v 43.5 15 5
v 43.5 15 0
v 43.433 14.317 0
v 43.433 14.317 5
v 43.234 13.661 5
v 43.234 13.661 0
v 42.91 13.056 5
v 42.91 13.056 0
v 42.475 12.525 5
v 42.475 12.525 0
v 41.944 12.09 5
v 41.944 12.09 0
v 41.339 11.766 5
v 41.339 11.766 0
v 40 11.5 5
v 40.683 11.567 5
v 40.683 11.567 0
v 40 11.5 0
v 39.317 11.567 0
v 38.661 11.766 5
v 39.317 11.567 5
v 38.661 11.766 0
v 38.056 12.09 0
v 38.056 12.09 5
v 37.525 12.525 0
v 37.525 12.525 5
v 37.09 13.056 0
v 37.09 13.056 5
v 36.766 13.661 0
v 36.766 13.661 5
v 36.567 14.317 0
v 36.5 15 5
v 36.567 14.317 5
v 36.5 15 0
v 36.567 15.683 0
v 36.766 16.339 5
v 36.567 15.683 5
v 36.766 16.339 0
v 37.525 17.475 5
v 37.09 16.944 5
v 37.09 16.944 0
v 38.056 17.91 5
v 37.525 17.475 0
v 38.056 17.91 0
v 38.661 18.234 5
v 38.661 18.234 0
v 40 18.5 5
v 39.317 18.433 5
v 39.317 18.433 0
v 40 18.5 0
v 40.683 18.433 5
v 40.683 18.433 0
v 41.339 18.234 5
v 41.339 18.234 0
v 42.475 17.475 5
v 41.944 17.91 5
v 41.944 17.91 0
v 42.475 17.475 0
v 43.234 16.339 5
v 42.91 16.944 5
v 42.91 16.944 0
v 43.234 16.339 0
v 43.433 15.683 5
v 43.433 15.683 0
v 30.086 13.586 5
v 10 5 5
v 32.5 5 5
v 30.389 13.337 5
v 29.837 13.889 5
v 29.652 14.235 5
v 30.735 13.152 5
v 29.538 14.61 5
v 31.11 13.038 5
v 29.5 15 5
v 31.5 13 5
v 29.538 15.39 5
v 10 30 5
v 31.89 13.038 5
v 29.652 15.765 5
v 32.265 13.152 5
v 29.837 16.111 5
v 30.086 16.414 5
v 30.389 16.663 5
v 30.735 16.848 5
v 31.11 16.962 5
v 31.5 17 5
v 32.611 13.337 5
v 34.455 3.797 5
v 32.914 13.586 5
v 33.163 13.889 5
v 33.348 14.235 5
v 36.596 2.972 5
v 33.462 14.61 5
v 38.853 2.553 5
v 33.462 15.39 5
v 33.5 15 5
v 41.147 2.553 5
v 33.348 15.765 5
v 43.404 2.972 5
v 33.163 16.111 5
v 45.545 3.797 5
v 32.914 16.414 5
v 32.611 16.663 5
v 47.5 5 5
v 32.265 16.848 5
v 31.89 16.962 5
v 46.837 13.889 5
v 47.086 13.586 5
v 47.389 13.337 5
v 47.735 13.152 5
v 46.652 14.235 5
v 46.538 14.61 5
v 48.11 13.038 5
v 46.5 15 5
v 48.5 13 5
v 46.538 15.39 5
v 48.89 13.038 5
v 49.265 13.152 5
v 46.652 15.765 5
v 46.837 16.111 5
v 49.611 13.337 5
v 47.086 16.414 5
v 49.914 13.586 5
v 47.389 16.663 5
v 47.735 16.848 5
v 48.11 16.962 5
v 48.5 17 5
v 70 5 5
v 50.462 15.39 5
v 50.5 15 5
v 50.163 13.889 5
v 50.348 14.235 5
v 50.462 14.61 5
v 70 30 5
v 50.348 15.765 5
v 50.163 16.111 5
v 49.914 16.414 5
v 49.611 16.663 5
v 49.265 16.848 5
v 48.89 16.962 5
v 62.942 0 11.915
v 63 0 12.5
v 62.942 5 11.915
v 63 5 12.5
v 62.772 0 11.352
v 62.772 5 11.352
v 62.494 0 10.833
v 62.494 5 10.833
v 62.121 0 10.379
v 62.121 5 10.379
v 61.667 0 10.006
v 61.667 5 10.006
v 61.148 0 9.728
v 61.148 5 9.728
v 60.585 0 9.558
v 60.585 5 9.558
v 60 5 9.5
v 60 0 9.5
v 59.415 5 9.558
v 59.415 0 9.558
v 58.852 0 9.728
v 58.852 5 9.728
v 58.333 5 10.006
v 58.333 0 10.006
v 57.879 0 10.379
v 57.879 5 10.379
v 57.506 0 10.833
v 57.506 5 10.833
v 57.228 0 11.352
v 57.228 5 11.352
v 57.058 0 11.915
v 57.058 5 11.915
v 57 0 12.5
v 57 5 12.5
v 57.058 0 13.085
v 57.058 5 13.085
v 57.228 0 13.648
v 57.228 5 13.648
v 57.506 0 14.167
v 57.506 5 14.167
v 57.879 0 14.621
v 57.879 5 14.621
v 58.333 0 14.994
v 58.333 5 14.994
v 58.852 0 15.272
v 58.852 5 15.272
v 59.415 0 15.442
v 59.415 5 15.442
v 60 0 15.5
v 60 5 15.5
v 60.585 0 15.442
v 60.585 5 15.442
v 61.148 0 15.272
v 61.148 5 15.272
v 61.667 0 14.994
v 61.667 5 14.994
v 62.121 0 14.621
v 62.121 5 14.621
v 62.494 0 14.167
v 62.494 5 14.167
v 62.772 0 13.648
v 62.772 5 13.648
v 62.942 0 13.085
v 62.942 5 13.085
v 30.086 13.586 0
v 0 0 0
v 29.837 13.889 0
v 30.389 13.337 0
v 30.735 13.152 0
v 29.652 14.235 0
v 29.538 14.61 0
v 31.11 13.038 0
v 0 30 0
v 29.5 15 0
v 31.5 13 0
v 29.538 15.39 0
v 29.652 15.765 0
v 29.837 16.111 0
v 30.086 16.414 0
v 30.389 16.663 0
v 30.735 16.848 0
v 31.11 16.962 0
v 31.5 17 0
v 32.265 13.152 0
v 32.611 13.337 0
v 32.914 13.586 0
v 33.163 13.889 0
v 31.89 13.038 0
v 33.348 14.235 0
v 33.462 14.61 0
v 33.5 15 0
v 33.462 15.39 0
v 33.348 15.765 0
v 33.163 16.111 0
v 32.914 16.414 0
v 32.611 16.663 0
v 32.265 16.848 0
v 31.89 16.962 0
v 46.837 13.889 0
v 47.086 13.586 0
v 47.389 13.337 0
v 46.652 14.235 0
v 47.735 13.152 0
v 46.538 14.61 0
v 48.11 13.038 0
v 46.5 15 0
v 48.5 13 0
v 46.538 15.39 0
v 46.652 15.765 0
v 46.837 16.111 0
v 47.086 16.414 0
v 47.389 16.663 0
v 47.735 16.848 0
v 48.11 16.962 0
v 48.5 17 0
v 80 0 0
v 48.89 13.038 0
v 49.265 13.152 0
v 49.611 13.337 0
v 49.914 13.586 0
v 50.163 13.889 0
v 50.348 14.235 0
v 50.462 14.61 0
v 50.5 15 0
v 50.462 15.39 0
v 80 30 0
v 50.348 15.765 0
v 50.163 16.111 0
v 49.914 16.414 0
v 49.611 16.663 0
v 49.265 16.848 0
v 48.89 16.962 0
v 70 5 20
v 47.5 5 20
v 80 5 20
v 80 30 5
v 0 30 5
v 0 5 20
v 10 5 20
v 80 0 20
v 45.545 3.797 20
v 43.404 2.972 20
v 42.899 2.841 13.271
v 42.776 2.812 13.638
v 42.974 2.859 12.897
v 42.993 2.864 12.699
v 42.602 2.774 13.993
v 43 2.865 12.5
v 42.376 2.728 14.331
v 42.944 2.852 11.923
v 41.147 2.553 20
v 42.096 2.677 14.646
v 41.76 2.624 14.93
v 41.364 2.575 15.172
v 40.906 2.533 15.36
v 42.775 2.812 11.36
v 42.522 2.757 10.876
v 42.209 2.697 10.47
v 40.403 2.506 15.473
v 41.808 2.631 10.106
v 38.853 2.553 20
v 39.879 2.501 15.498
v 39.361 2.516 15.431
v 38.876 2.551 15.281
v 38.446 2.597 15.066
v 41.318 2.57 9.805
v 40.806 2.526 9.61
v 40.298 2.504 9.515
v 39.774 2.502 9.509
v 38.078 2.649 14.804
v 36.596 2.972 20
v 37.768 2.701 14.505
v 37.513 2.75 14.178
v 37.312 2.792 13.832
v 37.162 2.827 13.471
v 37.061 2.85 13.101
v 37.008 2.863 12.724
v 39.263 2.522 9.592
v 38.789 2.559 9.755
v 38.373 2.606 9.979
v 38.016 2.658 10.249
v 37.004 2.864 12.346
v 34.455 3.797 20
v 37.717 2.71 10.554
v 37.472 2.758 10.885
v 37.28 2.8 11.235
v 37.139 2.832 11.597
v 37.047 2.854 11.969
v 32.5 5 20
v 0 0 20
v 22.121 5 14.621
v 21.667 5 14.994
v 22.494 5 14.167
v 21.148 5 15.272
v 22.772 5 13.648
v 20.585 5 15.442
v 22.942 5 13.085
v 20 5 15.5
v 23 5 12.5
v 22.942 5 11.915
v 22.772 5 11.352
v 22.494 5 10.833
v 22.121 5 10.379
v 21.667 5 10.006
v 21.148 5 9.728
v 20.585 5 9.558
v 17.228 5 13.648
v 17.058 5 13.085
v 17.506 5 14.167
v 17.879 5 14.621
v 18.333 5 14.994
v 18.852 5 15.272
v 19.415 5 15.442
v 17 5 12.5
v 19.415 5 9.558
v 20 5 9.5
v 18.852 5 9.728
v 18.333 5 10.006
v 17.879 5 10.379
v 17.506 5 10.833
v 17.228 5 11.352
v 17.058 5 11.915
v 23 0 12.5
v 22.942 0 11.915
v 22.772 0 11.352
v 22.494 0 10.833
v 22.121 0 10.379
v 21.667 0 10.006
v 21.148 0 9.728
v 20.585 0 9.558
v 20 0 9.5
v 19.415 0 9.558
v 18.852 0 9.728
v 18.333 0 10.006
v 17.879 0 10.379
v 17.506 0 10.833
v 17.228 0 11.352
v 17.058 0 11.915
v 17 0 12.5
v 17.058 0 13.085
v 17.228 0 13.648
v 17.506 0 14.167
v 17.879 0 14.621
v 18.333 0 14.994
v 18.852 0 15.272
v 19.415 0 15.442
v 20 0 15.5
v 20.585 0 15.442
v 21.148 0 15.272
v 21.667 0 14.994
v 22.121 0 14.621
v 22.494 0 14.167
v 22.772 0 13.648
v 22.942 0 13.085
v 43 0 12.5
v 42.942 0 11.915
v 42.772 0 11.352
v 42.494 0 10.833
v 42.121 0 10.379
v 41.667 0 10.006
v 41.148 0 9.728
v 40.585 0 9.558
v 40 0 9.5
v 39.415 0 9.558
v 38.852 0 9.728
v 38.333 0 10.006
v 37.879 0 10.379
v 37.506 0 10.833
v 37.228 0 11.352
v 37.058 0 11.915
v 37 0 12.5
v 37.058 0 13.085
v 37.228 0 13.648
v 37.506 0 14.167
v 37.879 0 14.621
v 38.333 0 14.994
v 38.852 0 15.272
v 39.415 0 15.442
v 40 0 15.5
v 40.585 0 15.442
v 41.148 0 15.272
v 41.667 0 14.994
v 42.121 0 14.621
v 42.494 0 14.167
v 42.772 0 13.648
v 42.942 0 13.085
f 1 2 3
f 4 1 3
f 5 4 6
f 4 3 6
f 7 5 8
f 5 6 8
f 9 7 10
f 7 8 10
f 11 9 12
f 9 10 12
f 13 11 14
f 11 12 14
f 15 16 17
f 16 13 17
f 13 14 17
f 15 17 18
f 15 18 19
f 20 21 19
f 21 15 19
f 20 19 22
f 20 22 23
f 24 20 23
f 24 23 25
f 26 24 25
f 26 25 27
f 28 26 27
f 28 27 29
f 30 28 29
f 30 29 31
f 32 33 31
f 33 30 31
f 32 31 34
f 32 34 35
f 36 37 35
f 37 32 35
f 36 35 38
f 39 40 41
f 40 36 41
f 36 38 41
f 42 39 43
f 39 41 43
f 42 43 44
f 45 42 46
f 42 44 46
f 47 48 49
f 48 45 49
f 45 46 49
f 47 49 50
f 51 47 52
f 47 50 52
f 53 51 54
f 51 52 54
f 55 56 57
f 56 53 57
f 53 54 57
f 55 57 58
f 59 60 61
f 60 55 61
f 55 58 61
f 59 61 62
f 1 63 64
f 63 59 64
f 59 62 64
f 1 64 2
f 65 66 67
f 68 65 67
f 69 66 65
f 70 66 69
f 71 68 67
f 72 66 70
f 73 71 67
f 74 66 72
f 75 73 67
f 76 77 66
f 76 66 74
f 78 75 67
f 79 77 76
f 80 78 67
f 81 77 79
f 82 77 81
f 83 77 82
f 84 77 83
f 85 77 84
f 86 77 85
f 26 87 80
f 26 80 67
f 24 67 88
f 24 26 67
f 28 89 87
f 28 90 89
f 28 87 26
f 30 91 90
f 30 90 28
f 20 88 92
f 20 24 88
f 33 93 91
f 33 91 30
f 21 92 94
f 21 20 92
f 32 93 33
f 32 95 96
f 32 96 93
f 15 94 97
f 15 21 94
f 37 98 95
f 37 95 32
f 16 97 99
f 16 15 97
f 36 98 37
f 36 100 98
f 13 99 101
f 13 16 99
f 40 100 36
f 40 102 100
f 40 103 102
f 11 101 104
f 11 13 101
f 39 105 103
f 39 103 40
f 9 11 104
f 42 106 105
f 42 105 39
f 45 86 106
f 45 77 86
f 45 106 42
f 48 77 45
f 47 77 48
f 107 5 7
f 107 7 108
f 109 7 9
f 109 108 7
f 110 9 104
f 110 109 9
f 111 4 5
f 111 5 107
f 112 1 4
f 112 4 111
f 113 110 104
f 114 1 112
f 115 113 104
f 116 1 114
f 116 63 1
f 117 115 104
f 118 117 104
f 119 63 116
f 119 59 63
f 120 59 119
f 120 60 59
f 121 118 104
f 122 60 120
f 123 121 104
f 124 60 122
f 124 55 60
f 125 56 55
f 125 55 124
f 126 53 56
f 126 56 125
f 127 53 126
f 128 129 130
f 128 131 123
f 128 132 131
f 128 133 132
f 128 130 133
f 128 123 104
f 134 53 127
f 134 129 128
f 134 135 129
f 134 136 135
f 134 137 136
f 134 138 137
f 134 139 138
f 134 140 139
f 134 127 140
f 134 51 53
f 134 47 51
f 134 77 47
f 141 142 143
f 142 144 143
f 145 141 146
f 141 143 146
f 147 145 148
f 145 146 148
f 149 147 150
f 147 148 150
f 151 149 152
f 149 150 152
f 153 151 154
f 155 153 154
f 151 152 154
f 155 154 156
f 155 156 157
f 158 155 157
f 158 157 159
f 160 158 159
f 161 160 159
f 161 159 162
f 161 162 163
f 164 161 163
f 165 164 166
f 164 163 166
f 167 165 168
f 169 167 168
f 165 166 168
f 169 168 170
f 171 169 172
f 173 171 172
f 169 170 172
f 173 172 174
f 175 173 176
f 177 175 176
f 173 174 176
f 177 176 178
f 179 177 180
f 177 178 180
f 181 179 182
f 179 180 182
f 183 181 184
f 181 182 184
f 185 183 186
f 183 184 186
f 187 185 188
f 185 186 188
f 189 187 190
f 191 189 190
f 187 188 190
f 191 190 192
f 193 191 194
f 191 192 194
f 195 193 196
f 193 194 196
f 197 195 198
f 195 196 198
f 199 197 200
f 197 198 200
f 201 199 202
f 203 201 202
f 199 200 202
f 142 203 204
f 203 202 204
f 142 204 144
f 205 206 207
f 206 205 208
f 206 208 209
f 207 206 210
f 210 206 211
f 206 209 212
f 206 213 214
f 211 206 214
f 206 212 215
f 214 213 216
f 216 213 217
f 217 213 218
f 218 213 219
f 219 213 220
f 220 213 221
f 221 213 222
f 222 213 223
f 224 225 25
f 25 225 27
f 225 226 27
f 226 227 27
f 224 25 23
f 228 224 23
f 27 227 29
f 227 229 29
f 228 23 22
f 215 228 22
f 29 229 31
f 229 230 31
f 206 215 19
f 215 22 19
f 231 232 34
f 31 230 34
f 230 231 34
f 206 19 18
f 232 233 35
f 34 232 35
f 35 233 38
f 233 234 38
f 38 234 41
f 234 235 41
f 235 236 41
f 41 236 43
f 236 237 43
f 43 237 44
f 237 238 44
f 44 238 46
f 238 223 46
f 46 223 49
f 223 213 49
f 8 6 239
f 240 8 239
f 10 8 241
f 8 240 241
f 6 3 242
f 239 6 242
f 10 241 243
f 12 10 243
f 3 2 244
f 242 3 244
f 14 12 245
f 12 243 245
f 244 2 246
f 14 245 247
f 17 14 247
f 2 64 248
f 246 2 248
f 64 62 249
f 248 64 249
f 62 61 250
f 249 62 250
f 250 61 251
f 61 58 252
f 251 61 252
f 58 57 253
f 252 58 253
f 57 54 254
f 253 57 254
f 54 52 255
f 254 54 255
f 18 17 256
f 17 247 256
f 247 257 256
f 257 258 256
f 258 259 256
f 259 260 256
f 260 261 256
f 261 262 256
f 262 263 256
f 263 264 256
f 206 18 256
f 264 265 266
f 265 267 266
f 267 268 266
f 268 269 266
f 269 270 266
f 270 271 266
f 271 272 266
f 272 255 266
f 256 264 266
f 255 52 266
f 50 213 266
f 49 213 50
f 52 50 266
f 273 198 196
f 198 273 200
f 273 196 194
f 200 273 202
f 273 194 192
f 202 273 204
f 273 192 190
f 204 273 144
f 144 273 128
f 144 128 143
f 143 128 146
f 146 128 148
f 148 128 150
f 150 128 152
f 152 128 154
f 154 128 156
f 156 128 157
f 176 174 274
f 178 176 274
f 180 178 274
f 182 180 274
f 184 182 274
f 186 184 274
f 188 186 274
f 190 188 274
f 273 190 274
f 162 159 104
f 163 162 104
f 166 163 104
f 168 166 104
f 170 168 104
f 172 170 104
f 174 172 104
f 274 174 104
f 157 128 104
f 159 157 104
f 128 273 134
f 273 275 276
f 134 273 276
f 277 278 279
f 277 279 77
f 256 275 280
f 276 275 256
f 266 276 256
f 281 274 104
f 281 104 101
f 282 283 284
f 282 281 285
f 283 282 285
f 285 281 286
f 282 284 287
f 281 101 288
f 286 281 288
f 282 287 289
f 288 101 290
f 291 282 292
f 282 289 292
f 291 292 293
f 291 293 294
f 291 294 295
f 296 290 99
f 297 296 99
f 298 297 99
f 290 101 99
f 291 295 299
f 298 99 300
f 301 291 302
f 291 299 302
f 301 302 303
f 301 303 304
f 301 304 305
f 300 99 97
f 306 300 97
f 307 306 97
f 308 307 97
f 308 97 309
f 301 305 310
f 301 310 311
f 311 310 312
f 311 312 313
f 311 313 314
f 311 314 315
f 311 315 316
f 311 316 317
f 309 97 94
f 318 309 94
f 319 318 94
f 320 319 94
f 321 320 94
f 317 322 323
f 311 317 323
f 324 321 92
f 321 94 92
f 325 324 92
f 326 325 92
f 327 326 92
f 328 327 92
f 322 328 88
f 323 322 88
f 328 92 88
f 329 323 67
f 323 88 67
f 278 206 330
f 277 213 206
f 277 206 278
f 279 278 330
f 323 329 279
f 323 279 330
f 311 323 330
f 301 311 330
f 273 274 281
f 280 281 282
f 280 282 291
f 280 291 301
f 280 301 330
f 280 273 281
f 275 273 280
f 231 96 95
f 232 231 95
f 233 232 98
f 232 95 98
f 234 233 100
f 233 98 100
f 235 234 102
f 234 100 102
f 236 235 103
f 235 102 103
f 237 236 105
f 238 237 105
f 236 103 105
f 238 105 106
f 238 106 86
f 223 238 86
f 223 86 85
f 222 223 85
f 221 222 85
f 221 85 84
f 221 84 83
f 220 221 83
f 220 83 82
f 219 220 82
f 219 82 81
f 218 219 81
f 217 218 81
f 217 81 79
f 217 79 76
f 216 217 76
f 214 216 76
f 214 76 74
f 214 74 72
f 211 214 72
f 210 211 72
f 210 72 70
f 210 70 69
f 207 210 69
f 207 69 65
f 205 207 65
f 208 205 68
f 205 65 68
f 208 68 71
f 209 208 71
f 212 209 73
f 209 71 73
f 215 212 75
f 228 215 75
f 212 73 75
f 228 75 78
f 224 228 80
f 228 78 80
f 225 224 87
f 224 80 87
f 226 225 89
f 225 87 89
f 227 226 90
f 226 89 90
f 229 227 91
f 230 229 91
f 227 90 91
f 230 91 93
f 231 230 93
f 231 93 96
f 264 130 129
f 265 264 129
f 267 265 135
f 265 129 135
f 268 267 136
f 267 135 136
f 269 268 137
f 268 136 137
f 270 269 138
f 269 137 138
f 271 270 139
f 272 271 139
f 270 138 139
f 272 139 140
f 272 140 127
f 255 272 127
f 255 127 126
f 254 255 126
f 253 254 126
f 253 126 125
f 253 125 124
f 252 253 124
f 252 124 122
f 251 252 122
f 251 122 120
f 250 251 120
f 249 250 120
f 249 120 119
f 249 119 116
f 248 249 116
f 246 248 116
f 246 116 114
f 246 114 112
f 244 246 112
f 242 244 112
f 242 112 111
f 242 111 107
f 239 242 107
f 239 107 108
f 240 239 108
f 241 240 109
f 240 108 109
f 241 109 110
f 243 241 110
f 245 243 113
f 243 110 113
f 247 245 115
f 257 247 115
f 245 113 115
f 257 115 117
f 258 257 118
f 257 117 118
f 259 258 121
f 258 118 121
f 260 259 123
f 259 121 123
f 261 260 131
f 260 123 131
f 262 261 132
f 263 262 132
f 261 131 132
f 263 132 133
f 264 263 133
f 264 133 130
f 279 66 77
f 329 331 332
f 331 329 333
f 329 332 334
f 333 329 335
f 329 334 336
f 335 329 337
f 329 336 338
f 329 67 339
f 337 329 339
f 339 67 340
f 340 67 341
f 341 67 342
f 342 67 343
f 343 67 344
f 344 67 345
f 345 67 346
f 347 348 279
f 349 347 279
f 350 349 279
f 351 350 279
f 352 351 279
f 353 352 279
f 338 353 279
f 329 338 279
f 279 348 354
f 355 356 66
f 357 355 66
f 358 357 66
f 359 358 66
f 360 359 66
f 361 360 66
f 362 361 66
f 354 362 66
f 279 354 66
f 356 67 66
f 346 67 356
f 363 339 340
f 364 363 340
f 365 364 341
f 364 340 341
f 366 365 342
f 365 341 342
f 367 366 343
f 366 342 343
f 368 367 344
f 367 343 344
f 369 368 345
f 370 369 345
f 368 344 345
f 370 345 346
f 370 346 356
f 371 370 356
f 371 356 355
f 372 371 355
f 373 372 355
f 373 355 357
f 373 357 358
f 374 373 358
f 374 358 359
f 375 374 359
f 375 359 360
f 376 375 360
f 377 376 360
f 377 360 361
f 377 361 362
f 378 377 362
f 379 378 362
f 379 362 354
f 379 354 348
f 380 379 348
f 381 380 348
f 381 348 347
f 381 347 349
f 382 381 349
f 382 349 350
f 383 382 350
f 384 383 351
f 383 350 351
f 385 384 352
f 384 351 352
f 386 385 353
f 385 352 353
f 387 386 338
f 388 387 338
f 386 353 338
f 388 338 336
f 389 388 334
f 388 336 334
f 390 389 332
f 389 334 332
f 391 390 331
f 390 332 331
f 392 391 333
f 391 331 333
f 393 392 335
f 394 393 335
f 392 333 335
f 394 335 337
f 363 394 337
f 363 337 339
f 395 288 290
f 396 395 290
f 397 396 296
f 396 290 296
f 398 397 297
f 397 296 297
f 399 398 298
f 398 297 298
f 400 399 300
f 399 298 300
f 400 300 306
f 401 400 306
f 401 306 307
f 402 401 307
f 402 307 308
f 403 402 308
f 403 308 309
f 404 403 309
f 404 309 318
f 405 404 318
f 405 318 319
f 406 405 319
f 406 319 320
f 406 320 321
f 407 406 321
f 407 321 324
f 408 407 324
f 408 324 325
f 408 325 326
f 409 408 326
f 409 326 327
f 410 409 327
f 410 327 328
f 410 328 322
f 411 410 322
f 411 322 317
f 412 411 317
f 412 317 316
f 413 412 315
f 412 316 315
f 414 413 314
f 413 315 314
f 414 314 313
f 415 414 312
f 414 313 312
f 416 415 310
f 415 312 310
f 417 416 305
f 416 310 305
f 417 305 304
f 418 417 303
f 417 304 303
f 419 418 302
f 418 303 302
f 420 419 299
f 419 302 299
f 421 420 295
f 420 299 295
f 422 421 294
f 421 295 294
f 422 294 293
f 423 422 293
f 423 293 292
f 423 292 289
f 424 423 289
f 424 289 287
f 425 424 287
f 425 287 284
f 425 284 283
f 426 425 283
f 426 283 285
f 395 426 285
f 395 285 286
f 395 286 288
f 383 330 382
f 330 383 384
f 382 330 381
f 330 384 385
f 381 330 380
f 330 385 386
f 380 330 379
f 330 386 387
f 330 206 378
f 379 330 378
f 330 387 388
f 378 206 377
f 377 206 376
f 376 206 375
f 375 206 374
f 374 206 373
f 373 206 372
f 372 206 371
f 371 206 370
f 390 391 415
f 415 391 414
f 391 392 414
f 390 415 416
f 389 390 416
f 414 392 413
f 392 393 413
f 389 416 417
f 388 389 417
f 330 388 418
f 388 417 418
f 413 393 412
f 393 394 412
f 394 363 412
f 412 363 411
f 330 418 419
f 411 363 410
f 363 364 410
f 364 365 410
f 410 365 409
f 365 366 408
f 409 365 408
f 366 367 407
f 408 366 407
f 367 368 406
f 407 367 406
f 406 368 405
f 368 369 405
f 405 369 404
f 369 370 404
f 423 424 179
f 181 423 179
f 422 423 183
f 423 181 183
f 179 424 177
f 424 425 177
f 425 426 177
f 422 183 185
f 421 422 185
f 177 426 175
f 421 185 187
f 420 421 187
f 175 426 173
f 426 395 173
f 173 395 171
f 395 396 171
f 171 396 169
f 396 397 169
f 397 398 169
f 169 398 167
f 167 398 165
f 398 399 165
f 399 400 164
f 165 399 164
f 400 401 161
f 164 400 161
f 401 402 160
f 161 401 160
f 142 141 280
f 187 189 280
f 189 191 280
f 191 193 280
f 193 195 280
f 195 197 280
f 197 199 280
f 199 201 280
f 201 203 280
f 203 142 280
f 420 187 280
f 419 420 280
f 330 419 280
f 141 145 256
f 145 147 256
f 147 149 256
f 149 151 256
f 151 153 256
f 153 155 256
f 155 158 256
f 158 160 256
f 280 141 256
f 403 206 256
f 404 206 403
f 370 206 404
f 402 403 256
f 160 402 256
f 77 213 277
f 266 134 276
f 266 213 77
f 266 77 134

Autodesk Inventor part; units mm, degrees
ref_plane "YZ Plane" through (0, 0, 0) normal (1, 0, 0) x (0, 1, 0)
ref_plane "XZ Plane" through (0, 0, 0) normal (0, 1, 0) x (-1, 0, 0)
ref_plane "XY Plane" through (0, 0, 0) normal (0, 0, 1) x (1, 0, 0)
sketch "Sketch1" plane through (0, 0, 0) normal (0, 0, 1) x (1, 0, 0)
  line L0 (0, 0) -> (80, 0)
  circle A0 centre (40, 15) radius 3.5
  line L1 (0, 0) -> (0, 30)
  line L2 (0, 30) -> (80, 30)
  line L3 (80, 30) -> (80, 0)
  point P0 (40, 0)
  dimension "d0" = 80
  dimension "d2" = 7
  dimension "d3" = 15
  dimension "d4" = 30
extrude "Extrusion1" add sketch "Sketch1" along normal blind 5
sketch "Sketch2" plane through (0, 0, 5) normal (0, 0, 1) x (1, 0, 0)
  line L0 (0, 0) -> (80, 0) projected
  line L1 (0, 0) -> (80, 0)
  line L2 (80, 0) -> (80, 5)
  line L3 (80, 5) -> (0, 5)
  line L4 (0, 5) -> (0, 0)
  line L5 (80, 0) -> (80, 30) projected
  point P0 (40, 0)
  dimension "d8" = 5
extrude "Extrusion2" add sketch "Sketch2" along normal blind 15
sketch "Sketch3" plane through (0, 0, 5) normal (0, 0, 1) x (1, 0, 0)
  circle A0 centre (31.5, 15) radius 2
  circle A1 centre (48.5, 15) radius 2
  line L0 (80, 5) -> (80, 30) projected
  line L1 (80, 30) -> (0, 30) projected
  line L2 (0, 30) -> (0, 5) projected
  line L3 (0, 5) -> (80, 5) projected
  circle A2 centre (40, 15) radius 3.5 projected
  line L4 (31.5, 15) -> (48.5, 15) construction
  point P0 (0, 0)
  dimension "d11" = 4
  dimension "d12" = 4
  dimension "d13" = 17
extrude "Extrusion3" cut sketch "Sketch3" against normal through all contours A0 | A1
sketch "Sketch5" plane through (0, 5, 5) normal (0, 1, 0) x (1, 0, 0)
  line L0 (0, 0) -> (0, -15) construction
  line L1 (80, 5) -> (80, -15) construction
  circle A0 centre (20, -7.5) radius 3
  circle A1 centre (40, -7.5) radius 3
  circle A2 centre (60, -7.5) radius 3
  line L2 (0, -7.5) -> (80, -7.5) construction
  point P0 (0, 5)
  point P1 (40, -7.5)
  point P2 (40, -7.5)
  dimension "d17" = 6
  dimension "d18" = 6
  dimension "d19" = 20
  dimension "d25" = 6
  dimension "d26" = 20
extrude "Extrusion4" cut sketch "Sketch5" against normal through all
sketch "Sketch6" plane through (0, 0, 5) normal (0, 0, 1) x (1, 0, 0)
  circle A0 centre (40, 15) radius 3.5 projected
  circle A1 centre (40, 15) radius 12.5
  point P0 (0, 0)
  dimension "d27" = 25
extrude "Extrusion5" cut sketch "Sketch6" along normal through all
sketch "Sketch8" plane through (80, 0, 0) normal (1, 0, 0) x (0, 0, -1)
  line L0 (-5, 5) -> (-20, 5) projected
  line L1 (-5, 5) -> (-5, 30) projected
  line L2 (-20, 5) -> (-5, 30)
  line L3 (-5, 30) -> (-5, 5)
  line L4 (-5, 5) -> (-20, 5)
  point P0 (0, 0)
extrude "Extrusion6" add sketch "Sketch8" against normal blind 10
sketch "Sketch9" plane through (0, 0, 0) normal (-1, 0, 0) x (0, 0, 1)
  line L0 (20, 0) -> (20, 5) projected
  line L1 (20, 5) -> (5, 30)
  line L2 (5, 5) -> (20, 5) projected
  line L3 (5, 30) -> (5, 5)
  line L4 (5, 5) -> (20, 5)
  point P0 (0, 0)
extrude "Extrusion7" add sketch "Sketch9" against normal blind 10
properties part number "C005" material "ABS Plastic"
